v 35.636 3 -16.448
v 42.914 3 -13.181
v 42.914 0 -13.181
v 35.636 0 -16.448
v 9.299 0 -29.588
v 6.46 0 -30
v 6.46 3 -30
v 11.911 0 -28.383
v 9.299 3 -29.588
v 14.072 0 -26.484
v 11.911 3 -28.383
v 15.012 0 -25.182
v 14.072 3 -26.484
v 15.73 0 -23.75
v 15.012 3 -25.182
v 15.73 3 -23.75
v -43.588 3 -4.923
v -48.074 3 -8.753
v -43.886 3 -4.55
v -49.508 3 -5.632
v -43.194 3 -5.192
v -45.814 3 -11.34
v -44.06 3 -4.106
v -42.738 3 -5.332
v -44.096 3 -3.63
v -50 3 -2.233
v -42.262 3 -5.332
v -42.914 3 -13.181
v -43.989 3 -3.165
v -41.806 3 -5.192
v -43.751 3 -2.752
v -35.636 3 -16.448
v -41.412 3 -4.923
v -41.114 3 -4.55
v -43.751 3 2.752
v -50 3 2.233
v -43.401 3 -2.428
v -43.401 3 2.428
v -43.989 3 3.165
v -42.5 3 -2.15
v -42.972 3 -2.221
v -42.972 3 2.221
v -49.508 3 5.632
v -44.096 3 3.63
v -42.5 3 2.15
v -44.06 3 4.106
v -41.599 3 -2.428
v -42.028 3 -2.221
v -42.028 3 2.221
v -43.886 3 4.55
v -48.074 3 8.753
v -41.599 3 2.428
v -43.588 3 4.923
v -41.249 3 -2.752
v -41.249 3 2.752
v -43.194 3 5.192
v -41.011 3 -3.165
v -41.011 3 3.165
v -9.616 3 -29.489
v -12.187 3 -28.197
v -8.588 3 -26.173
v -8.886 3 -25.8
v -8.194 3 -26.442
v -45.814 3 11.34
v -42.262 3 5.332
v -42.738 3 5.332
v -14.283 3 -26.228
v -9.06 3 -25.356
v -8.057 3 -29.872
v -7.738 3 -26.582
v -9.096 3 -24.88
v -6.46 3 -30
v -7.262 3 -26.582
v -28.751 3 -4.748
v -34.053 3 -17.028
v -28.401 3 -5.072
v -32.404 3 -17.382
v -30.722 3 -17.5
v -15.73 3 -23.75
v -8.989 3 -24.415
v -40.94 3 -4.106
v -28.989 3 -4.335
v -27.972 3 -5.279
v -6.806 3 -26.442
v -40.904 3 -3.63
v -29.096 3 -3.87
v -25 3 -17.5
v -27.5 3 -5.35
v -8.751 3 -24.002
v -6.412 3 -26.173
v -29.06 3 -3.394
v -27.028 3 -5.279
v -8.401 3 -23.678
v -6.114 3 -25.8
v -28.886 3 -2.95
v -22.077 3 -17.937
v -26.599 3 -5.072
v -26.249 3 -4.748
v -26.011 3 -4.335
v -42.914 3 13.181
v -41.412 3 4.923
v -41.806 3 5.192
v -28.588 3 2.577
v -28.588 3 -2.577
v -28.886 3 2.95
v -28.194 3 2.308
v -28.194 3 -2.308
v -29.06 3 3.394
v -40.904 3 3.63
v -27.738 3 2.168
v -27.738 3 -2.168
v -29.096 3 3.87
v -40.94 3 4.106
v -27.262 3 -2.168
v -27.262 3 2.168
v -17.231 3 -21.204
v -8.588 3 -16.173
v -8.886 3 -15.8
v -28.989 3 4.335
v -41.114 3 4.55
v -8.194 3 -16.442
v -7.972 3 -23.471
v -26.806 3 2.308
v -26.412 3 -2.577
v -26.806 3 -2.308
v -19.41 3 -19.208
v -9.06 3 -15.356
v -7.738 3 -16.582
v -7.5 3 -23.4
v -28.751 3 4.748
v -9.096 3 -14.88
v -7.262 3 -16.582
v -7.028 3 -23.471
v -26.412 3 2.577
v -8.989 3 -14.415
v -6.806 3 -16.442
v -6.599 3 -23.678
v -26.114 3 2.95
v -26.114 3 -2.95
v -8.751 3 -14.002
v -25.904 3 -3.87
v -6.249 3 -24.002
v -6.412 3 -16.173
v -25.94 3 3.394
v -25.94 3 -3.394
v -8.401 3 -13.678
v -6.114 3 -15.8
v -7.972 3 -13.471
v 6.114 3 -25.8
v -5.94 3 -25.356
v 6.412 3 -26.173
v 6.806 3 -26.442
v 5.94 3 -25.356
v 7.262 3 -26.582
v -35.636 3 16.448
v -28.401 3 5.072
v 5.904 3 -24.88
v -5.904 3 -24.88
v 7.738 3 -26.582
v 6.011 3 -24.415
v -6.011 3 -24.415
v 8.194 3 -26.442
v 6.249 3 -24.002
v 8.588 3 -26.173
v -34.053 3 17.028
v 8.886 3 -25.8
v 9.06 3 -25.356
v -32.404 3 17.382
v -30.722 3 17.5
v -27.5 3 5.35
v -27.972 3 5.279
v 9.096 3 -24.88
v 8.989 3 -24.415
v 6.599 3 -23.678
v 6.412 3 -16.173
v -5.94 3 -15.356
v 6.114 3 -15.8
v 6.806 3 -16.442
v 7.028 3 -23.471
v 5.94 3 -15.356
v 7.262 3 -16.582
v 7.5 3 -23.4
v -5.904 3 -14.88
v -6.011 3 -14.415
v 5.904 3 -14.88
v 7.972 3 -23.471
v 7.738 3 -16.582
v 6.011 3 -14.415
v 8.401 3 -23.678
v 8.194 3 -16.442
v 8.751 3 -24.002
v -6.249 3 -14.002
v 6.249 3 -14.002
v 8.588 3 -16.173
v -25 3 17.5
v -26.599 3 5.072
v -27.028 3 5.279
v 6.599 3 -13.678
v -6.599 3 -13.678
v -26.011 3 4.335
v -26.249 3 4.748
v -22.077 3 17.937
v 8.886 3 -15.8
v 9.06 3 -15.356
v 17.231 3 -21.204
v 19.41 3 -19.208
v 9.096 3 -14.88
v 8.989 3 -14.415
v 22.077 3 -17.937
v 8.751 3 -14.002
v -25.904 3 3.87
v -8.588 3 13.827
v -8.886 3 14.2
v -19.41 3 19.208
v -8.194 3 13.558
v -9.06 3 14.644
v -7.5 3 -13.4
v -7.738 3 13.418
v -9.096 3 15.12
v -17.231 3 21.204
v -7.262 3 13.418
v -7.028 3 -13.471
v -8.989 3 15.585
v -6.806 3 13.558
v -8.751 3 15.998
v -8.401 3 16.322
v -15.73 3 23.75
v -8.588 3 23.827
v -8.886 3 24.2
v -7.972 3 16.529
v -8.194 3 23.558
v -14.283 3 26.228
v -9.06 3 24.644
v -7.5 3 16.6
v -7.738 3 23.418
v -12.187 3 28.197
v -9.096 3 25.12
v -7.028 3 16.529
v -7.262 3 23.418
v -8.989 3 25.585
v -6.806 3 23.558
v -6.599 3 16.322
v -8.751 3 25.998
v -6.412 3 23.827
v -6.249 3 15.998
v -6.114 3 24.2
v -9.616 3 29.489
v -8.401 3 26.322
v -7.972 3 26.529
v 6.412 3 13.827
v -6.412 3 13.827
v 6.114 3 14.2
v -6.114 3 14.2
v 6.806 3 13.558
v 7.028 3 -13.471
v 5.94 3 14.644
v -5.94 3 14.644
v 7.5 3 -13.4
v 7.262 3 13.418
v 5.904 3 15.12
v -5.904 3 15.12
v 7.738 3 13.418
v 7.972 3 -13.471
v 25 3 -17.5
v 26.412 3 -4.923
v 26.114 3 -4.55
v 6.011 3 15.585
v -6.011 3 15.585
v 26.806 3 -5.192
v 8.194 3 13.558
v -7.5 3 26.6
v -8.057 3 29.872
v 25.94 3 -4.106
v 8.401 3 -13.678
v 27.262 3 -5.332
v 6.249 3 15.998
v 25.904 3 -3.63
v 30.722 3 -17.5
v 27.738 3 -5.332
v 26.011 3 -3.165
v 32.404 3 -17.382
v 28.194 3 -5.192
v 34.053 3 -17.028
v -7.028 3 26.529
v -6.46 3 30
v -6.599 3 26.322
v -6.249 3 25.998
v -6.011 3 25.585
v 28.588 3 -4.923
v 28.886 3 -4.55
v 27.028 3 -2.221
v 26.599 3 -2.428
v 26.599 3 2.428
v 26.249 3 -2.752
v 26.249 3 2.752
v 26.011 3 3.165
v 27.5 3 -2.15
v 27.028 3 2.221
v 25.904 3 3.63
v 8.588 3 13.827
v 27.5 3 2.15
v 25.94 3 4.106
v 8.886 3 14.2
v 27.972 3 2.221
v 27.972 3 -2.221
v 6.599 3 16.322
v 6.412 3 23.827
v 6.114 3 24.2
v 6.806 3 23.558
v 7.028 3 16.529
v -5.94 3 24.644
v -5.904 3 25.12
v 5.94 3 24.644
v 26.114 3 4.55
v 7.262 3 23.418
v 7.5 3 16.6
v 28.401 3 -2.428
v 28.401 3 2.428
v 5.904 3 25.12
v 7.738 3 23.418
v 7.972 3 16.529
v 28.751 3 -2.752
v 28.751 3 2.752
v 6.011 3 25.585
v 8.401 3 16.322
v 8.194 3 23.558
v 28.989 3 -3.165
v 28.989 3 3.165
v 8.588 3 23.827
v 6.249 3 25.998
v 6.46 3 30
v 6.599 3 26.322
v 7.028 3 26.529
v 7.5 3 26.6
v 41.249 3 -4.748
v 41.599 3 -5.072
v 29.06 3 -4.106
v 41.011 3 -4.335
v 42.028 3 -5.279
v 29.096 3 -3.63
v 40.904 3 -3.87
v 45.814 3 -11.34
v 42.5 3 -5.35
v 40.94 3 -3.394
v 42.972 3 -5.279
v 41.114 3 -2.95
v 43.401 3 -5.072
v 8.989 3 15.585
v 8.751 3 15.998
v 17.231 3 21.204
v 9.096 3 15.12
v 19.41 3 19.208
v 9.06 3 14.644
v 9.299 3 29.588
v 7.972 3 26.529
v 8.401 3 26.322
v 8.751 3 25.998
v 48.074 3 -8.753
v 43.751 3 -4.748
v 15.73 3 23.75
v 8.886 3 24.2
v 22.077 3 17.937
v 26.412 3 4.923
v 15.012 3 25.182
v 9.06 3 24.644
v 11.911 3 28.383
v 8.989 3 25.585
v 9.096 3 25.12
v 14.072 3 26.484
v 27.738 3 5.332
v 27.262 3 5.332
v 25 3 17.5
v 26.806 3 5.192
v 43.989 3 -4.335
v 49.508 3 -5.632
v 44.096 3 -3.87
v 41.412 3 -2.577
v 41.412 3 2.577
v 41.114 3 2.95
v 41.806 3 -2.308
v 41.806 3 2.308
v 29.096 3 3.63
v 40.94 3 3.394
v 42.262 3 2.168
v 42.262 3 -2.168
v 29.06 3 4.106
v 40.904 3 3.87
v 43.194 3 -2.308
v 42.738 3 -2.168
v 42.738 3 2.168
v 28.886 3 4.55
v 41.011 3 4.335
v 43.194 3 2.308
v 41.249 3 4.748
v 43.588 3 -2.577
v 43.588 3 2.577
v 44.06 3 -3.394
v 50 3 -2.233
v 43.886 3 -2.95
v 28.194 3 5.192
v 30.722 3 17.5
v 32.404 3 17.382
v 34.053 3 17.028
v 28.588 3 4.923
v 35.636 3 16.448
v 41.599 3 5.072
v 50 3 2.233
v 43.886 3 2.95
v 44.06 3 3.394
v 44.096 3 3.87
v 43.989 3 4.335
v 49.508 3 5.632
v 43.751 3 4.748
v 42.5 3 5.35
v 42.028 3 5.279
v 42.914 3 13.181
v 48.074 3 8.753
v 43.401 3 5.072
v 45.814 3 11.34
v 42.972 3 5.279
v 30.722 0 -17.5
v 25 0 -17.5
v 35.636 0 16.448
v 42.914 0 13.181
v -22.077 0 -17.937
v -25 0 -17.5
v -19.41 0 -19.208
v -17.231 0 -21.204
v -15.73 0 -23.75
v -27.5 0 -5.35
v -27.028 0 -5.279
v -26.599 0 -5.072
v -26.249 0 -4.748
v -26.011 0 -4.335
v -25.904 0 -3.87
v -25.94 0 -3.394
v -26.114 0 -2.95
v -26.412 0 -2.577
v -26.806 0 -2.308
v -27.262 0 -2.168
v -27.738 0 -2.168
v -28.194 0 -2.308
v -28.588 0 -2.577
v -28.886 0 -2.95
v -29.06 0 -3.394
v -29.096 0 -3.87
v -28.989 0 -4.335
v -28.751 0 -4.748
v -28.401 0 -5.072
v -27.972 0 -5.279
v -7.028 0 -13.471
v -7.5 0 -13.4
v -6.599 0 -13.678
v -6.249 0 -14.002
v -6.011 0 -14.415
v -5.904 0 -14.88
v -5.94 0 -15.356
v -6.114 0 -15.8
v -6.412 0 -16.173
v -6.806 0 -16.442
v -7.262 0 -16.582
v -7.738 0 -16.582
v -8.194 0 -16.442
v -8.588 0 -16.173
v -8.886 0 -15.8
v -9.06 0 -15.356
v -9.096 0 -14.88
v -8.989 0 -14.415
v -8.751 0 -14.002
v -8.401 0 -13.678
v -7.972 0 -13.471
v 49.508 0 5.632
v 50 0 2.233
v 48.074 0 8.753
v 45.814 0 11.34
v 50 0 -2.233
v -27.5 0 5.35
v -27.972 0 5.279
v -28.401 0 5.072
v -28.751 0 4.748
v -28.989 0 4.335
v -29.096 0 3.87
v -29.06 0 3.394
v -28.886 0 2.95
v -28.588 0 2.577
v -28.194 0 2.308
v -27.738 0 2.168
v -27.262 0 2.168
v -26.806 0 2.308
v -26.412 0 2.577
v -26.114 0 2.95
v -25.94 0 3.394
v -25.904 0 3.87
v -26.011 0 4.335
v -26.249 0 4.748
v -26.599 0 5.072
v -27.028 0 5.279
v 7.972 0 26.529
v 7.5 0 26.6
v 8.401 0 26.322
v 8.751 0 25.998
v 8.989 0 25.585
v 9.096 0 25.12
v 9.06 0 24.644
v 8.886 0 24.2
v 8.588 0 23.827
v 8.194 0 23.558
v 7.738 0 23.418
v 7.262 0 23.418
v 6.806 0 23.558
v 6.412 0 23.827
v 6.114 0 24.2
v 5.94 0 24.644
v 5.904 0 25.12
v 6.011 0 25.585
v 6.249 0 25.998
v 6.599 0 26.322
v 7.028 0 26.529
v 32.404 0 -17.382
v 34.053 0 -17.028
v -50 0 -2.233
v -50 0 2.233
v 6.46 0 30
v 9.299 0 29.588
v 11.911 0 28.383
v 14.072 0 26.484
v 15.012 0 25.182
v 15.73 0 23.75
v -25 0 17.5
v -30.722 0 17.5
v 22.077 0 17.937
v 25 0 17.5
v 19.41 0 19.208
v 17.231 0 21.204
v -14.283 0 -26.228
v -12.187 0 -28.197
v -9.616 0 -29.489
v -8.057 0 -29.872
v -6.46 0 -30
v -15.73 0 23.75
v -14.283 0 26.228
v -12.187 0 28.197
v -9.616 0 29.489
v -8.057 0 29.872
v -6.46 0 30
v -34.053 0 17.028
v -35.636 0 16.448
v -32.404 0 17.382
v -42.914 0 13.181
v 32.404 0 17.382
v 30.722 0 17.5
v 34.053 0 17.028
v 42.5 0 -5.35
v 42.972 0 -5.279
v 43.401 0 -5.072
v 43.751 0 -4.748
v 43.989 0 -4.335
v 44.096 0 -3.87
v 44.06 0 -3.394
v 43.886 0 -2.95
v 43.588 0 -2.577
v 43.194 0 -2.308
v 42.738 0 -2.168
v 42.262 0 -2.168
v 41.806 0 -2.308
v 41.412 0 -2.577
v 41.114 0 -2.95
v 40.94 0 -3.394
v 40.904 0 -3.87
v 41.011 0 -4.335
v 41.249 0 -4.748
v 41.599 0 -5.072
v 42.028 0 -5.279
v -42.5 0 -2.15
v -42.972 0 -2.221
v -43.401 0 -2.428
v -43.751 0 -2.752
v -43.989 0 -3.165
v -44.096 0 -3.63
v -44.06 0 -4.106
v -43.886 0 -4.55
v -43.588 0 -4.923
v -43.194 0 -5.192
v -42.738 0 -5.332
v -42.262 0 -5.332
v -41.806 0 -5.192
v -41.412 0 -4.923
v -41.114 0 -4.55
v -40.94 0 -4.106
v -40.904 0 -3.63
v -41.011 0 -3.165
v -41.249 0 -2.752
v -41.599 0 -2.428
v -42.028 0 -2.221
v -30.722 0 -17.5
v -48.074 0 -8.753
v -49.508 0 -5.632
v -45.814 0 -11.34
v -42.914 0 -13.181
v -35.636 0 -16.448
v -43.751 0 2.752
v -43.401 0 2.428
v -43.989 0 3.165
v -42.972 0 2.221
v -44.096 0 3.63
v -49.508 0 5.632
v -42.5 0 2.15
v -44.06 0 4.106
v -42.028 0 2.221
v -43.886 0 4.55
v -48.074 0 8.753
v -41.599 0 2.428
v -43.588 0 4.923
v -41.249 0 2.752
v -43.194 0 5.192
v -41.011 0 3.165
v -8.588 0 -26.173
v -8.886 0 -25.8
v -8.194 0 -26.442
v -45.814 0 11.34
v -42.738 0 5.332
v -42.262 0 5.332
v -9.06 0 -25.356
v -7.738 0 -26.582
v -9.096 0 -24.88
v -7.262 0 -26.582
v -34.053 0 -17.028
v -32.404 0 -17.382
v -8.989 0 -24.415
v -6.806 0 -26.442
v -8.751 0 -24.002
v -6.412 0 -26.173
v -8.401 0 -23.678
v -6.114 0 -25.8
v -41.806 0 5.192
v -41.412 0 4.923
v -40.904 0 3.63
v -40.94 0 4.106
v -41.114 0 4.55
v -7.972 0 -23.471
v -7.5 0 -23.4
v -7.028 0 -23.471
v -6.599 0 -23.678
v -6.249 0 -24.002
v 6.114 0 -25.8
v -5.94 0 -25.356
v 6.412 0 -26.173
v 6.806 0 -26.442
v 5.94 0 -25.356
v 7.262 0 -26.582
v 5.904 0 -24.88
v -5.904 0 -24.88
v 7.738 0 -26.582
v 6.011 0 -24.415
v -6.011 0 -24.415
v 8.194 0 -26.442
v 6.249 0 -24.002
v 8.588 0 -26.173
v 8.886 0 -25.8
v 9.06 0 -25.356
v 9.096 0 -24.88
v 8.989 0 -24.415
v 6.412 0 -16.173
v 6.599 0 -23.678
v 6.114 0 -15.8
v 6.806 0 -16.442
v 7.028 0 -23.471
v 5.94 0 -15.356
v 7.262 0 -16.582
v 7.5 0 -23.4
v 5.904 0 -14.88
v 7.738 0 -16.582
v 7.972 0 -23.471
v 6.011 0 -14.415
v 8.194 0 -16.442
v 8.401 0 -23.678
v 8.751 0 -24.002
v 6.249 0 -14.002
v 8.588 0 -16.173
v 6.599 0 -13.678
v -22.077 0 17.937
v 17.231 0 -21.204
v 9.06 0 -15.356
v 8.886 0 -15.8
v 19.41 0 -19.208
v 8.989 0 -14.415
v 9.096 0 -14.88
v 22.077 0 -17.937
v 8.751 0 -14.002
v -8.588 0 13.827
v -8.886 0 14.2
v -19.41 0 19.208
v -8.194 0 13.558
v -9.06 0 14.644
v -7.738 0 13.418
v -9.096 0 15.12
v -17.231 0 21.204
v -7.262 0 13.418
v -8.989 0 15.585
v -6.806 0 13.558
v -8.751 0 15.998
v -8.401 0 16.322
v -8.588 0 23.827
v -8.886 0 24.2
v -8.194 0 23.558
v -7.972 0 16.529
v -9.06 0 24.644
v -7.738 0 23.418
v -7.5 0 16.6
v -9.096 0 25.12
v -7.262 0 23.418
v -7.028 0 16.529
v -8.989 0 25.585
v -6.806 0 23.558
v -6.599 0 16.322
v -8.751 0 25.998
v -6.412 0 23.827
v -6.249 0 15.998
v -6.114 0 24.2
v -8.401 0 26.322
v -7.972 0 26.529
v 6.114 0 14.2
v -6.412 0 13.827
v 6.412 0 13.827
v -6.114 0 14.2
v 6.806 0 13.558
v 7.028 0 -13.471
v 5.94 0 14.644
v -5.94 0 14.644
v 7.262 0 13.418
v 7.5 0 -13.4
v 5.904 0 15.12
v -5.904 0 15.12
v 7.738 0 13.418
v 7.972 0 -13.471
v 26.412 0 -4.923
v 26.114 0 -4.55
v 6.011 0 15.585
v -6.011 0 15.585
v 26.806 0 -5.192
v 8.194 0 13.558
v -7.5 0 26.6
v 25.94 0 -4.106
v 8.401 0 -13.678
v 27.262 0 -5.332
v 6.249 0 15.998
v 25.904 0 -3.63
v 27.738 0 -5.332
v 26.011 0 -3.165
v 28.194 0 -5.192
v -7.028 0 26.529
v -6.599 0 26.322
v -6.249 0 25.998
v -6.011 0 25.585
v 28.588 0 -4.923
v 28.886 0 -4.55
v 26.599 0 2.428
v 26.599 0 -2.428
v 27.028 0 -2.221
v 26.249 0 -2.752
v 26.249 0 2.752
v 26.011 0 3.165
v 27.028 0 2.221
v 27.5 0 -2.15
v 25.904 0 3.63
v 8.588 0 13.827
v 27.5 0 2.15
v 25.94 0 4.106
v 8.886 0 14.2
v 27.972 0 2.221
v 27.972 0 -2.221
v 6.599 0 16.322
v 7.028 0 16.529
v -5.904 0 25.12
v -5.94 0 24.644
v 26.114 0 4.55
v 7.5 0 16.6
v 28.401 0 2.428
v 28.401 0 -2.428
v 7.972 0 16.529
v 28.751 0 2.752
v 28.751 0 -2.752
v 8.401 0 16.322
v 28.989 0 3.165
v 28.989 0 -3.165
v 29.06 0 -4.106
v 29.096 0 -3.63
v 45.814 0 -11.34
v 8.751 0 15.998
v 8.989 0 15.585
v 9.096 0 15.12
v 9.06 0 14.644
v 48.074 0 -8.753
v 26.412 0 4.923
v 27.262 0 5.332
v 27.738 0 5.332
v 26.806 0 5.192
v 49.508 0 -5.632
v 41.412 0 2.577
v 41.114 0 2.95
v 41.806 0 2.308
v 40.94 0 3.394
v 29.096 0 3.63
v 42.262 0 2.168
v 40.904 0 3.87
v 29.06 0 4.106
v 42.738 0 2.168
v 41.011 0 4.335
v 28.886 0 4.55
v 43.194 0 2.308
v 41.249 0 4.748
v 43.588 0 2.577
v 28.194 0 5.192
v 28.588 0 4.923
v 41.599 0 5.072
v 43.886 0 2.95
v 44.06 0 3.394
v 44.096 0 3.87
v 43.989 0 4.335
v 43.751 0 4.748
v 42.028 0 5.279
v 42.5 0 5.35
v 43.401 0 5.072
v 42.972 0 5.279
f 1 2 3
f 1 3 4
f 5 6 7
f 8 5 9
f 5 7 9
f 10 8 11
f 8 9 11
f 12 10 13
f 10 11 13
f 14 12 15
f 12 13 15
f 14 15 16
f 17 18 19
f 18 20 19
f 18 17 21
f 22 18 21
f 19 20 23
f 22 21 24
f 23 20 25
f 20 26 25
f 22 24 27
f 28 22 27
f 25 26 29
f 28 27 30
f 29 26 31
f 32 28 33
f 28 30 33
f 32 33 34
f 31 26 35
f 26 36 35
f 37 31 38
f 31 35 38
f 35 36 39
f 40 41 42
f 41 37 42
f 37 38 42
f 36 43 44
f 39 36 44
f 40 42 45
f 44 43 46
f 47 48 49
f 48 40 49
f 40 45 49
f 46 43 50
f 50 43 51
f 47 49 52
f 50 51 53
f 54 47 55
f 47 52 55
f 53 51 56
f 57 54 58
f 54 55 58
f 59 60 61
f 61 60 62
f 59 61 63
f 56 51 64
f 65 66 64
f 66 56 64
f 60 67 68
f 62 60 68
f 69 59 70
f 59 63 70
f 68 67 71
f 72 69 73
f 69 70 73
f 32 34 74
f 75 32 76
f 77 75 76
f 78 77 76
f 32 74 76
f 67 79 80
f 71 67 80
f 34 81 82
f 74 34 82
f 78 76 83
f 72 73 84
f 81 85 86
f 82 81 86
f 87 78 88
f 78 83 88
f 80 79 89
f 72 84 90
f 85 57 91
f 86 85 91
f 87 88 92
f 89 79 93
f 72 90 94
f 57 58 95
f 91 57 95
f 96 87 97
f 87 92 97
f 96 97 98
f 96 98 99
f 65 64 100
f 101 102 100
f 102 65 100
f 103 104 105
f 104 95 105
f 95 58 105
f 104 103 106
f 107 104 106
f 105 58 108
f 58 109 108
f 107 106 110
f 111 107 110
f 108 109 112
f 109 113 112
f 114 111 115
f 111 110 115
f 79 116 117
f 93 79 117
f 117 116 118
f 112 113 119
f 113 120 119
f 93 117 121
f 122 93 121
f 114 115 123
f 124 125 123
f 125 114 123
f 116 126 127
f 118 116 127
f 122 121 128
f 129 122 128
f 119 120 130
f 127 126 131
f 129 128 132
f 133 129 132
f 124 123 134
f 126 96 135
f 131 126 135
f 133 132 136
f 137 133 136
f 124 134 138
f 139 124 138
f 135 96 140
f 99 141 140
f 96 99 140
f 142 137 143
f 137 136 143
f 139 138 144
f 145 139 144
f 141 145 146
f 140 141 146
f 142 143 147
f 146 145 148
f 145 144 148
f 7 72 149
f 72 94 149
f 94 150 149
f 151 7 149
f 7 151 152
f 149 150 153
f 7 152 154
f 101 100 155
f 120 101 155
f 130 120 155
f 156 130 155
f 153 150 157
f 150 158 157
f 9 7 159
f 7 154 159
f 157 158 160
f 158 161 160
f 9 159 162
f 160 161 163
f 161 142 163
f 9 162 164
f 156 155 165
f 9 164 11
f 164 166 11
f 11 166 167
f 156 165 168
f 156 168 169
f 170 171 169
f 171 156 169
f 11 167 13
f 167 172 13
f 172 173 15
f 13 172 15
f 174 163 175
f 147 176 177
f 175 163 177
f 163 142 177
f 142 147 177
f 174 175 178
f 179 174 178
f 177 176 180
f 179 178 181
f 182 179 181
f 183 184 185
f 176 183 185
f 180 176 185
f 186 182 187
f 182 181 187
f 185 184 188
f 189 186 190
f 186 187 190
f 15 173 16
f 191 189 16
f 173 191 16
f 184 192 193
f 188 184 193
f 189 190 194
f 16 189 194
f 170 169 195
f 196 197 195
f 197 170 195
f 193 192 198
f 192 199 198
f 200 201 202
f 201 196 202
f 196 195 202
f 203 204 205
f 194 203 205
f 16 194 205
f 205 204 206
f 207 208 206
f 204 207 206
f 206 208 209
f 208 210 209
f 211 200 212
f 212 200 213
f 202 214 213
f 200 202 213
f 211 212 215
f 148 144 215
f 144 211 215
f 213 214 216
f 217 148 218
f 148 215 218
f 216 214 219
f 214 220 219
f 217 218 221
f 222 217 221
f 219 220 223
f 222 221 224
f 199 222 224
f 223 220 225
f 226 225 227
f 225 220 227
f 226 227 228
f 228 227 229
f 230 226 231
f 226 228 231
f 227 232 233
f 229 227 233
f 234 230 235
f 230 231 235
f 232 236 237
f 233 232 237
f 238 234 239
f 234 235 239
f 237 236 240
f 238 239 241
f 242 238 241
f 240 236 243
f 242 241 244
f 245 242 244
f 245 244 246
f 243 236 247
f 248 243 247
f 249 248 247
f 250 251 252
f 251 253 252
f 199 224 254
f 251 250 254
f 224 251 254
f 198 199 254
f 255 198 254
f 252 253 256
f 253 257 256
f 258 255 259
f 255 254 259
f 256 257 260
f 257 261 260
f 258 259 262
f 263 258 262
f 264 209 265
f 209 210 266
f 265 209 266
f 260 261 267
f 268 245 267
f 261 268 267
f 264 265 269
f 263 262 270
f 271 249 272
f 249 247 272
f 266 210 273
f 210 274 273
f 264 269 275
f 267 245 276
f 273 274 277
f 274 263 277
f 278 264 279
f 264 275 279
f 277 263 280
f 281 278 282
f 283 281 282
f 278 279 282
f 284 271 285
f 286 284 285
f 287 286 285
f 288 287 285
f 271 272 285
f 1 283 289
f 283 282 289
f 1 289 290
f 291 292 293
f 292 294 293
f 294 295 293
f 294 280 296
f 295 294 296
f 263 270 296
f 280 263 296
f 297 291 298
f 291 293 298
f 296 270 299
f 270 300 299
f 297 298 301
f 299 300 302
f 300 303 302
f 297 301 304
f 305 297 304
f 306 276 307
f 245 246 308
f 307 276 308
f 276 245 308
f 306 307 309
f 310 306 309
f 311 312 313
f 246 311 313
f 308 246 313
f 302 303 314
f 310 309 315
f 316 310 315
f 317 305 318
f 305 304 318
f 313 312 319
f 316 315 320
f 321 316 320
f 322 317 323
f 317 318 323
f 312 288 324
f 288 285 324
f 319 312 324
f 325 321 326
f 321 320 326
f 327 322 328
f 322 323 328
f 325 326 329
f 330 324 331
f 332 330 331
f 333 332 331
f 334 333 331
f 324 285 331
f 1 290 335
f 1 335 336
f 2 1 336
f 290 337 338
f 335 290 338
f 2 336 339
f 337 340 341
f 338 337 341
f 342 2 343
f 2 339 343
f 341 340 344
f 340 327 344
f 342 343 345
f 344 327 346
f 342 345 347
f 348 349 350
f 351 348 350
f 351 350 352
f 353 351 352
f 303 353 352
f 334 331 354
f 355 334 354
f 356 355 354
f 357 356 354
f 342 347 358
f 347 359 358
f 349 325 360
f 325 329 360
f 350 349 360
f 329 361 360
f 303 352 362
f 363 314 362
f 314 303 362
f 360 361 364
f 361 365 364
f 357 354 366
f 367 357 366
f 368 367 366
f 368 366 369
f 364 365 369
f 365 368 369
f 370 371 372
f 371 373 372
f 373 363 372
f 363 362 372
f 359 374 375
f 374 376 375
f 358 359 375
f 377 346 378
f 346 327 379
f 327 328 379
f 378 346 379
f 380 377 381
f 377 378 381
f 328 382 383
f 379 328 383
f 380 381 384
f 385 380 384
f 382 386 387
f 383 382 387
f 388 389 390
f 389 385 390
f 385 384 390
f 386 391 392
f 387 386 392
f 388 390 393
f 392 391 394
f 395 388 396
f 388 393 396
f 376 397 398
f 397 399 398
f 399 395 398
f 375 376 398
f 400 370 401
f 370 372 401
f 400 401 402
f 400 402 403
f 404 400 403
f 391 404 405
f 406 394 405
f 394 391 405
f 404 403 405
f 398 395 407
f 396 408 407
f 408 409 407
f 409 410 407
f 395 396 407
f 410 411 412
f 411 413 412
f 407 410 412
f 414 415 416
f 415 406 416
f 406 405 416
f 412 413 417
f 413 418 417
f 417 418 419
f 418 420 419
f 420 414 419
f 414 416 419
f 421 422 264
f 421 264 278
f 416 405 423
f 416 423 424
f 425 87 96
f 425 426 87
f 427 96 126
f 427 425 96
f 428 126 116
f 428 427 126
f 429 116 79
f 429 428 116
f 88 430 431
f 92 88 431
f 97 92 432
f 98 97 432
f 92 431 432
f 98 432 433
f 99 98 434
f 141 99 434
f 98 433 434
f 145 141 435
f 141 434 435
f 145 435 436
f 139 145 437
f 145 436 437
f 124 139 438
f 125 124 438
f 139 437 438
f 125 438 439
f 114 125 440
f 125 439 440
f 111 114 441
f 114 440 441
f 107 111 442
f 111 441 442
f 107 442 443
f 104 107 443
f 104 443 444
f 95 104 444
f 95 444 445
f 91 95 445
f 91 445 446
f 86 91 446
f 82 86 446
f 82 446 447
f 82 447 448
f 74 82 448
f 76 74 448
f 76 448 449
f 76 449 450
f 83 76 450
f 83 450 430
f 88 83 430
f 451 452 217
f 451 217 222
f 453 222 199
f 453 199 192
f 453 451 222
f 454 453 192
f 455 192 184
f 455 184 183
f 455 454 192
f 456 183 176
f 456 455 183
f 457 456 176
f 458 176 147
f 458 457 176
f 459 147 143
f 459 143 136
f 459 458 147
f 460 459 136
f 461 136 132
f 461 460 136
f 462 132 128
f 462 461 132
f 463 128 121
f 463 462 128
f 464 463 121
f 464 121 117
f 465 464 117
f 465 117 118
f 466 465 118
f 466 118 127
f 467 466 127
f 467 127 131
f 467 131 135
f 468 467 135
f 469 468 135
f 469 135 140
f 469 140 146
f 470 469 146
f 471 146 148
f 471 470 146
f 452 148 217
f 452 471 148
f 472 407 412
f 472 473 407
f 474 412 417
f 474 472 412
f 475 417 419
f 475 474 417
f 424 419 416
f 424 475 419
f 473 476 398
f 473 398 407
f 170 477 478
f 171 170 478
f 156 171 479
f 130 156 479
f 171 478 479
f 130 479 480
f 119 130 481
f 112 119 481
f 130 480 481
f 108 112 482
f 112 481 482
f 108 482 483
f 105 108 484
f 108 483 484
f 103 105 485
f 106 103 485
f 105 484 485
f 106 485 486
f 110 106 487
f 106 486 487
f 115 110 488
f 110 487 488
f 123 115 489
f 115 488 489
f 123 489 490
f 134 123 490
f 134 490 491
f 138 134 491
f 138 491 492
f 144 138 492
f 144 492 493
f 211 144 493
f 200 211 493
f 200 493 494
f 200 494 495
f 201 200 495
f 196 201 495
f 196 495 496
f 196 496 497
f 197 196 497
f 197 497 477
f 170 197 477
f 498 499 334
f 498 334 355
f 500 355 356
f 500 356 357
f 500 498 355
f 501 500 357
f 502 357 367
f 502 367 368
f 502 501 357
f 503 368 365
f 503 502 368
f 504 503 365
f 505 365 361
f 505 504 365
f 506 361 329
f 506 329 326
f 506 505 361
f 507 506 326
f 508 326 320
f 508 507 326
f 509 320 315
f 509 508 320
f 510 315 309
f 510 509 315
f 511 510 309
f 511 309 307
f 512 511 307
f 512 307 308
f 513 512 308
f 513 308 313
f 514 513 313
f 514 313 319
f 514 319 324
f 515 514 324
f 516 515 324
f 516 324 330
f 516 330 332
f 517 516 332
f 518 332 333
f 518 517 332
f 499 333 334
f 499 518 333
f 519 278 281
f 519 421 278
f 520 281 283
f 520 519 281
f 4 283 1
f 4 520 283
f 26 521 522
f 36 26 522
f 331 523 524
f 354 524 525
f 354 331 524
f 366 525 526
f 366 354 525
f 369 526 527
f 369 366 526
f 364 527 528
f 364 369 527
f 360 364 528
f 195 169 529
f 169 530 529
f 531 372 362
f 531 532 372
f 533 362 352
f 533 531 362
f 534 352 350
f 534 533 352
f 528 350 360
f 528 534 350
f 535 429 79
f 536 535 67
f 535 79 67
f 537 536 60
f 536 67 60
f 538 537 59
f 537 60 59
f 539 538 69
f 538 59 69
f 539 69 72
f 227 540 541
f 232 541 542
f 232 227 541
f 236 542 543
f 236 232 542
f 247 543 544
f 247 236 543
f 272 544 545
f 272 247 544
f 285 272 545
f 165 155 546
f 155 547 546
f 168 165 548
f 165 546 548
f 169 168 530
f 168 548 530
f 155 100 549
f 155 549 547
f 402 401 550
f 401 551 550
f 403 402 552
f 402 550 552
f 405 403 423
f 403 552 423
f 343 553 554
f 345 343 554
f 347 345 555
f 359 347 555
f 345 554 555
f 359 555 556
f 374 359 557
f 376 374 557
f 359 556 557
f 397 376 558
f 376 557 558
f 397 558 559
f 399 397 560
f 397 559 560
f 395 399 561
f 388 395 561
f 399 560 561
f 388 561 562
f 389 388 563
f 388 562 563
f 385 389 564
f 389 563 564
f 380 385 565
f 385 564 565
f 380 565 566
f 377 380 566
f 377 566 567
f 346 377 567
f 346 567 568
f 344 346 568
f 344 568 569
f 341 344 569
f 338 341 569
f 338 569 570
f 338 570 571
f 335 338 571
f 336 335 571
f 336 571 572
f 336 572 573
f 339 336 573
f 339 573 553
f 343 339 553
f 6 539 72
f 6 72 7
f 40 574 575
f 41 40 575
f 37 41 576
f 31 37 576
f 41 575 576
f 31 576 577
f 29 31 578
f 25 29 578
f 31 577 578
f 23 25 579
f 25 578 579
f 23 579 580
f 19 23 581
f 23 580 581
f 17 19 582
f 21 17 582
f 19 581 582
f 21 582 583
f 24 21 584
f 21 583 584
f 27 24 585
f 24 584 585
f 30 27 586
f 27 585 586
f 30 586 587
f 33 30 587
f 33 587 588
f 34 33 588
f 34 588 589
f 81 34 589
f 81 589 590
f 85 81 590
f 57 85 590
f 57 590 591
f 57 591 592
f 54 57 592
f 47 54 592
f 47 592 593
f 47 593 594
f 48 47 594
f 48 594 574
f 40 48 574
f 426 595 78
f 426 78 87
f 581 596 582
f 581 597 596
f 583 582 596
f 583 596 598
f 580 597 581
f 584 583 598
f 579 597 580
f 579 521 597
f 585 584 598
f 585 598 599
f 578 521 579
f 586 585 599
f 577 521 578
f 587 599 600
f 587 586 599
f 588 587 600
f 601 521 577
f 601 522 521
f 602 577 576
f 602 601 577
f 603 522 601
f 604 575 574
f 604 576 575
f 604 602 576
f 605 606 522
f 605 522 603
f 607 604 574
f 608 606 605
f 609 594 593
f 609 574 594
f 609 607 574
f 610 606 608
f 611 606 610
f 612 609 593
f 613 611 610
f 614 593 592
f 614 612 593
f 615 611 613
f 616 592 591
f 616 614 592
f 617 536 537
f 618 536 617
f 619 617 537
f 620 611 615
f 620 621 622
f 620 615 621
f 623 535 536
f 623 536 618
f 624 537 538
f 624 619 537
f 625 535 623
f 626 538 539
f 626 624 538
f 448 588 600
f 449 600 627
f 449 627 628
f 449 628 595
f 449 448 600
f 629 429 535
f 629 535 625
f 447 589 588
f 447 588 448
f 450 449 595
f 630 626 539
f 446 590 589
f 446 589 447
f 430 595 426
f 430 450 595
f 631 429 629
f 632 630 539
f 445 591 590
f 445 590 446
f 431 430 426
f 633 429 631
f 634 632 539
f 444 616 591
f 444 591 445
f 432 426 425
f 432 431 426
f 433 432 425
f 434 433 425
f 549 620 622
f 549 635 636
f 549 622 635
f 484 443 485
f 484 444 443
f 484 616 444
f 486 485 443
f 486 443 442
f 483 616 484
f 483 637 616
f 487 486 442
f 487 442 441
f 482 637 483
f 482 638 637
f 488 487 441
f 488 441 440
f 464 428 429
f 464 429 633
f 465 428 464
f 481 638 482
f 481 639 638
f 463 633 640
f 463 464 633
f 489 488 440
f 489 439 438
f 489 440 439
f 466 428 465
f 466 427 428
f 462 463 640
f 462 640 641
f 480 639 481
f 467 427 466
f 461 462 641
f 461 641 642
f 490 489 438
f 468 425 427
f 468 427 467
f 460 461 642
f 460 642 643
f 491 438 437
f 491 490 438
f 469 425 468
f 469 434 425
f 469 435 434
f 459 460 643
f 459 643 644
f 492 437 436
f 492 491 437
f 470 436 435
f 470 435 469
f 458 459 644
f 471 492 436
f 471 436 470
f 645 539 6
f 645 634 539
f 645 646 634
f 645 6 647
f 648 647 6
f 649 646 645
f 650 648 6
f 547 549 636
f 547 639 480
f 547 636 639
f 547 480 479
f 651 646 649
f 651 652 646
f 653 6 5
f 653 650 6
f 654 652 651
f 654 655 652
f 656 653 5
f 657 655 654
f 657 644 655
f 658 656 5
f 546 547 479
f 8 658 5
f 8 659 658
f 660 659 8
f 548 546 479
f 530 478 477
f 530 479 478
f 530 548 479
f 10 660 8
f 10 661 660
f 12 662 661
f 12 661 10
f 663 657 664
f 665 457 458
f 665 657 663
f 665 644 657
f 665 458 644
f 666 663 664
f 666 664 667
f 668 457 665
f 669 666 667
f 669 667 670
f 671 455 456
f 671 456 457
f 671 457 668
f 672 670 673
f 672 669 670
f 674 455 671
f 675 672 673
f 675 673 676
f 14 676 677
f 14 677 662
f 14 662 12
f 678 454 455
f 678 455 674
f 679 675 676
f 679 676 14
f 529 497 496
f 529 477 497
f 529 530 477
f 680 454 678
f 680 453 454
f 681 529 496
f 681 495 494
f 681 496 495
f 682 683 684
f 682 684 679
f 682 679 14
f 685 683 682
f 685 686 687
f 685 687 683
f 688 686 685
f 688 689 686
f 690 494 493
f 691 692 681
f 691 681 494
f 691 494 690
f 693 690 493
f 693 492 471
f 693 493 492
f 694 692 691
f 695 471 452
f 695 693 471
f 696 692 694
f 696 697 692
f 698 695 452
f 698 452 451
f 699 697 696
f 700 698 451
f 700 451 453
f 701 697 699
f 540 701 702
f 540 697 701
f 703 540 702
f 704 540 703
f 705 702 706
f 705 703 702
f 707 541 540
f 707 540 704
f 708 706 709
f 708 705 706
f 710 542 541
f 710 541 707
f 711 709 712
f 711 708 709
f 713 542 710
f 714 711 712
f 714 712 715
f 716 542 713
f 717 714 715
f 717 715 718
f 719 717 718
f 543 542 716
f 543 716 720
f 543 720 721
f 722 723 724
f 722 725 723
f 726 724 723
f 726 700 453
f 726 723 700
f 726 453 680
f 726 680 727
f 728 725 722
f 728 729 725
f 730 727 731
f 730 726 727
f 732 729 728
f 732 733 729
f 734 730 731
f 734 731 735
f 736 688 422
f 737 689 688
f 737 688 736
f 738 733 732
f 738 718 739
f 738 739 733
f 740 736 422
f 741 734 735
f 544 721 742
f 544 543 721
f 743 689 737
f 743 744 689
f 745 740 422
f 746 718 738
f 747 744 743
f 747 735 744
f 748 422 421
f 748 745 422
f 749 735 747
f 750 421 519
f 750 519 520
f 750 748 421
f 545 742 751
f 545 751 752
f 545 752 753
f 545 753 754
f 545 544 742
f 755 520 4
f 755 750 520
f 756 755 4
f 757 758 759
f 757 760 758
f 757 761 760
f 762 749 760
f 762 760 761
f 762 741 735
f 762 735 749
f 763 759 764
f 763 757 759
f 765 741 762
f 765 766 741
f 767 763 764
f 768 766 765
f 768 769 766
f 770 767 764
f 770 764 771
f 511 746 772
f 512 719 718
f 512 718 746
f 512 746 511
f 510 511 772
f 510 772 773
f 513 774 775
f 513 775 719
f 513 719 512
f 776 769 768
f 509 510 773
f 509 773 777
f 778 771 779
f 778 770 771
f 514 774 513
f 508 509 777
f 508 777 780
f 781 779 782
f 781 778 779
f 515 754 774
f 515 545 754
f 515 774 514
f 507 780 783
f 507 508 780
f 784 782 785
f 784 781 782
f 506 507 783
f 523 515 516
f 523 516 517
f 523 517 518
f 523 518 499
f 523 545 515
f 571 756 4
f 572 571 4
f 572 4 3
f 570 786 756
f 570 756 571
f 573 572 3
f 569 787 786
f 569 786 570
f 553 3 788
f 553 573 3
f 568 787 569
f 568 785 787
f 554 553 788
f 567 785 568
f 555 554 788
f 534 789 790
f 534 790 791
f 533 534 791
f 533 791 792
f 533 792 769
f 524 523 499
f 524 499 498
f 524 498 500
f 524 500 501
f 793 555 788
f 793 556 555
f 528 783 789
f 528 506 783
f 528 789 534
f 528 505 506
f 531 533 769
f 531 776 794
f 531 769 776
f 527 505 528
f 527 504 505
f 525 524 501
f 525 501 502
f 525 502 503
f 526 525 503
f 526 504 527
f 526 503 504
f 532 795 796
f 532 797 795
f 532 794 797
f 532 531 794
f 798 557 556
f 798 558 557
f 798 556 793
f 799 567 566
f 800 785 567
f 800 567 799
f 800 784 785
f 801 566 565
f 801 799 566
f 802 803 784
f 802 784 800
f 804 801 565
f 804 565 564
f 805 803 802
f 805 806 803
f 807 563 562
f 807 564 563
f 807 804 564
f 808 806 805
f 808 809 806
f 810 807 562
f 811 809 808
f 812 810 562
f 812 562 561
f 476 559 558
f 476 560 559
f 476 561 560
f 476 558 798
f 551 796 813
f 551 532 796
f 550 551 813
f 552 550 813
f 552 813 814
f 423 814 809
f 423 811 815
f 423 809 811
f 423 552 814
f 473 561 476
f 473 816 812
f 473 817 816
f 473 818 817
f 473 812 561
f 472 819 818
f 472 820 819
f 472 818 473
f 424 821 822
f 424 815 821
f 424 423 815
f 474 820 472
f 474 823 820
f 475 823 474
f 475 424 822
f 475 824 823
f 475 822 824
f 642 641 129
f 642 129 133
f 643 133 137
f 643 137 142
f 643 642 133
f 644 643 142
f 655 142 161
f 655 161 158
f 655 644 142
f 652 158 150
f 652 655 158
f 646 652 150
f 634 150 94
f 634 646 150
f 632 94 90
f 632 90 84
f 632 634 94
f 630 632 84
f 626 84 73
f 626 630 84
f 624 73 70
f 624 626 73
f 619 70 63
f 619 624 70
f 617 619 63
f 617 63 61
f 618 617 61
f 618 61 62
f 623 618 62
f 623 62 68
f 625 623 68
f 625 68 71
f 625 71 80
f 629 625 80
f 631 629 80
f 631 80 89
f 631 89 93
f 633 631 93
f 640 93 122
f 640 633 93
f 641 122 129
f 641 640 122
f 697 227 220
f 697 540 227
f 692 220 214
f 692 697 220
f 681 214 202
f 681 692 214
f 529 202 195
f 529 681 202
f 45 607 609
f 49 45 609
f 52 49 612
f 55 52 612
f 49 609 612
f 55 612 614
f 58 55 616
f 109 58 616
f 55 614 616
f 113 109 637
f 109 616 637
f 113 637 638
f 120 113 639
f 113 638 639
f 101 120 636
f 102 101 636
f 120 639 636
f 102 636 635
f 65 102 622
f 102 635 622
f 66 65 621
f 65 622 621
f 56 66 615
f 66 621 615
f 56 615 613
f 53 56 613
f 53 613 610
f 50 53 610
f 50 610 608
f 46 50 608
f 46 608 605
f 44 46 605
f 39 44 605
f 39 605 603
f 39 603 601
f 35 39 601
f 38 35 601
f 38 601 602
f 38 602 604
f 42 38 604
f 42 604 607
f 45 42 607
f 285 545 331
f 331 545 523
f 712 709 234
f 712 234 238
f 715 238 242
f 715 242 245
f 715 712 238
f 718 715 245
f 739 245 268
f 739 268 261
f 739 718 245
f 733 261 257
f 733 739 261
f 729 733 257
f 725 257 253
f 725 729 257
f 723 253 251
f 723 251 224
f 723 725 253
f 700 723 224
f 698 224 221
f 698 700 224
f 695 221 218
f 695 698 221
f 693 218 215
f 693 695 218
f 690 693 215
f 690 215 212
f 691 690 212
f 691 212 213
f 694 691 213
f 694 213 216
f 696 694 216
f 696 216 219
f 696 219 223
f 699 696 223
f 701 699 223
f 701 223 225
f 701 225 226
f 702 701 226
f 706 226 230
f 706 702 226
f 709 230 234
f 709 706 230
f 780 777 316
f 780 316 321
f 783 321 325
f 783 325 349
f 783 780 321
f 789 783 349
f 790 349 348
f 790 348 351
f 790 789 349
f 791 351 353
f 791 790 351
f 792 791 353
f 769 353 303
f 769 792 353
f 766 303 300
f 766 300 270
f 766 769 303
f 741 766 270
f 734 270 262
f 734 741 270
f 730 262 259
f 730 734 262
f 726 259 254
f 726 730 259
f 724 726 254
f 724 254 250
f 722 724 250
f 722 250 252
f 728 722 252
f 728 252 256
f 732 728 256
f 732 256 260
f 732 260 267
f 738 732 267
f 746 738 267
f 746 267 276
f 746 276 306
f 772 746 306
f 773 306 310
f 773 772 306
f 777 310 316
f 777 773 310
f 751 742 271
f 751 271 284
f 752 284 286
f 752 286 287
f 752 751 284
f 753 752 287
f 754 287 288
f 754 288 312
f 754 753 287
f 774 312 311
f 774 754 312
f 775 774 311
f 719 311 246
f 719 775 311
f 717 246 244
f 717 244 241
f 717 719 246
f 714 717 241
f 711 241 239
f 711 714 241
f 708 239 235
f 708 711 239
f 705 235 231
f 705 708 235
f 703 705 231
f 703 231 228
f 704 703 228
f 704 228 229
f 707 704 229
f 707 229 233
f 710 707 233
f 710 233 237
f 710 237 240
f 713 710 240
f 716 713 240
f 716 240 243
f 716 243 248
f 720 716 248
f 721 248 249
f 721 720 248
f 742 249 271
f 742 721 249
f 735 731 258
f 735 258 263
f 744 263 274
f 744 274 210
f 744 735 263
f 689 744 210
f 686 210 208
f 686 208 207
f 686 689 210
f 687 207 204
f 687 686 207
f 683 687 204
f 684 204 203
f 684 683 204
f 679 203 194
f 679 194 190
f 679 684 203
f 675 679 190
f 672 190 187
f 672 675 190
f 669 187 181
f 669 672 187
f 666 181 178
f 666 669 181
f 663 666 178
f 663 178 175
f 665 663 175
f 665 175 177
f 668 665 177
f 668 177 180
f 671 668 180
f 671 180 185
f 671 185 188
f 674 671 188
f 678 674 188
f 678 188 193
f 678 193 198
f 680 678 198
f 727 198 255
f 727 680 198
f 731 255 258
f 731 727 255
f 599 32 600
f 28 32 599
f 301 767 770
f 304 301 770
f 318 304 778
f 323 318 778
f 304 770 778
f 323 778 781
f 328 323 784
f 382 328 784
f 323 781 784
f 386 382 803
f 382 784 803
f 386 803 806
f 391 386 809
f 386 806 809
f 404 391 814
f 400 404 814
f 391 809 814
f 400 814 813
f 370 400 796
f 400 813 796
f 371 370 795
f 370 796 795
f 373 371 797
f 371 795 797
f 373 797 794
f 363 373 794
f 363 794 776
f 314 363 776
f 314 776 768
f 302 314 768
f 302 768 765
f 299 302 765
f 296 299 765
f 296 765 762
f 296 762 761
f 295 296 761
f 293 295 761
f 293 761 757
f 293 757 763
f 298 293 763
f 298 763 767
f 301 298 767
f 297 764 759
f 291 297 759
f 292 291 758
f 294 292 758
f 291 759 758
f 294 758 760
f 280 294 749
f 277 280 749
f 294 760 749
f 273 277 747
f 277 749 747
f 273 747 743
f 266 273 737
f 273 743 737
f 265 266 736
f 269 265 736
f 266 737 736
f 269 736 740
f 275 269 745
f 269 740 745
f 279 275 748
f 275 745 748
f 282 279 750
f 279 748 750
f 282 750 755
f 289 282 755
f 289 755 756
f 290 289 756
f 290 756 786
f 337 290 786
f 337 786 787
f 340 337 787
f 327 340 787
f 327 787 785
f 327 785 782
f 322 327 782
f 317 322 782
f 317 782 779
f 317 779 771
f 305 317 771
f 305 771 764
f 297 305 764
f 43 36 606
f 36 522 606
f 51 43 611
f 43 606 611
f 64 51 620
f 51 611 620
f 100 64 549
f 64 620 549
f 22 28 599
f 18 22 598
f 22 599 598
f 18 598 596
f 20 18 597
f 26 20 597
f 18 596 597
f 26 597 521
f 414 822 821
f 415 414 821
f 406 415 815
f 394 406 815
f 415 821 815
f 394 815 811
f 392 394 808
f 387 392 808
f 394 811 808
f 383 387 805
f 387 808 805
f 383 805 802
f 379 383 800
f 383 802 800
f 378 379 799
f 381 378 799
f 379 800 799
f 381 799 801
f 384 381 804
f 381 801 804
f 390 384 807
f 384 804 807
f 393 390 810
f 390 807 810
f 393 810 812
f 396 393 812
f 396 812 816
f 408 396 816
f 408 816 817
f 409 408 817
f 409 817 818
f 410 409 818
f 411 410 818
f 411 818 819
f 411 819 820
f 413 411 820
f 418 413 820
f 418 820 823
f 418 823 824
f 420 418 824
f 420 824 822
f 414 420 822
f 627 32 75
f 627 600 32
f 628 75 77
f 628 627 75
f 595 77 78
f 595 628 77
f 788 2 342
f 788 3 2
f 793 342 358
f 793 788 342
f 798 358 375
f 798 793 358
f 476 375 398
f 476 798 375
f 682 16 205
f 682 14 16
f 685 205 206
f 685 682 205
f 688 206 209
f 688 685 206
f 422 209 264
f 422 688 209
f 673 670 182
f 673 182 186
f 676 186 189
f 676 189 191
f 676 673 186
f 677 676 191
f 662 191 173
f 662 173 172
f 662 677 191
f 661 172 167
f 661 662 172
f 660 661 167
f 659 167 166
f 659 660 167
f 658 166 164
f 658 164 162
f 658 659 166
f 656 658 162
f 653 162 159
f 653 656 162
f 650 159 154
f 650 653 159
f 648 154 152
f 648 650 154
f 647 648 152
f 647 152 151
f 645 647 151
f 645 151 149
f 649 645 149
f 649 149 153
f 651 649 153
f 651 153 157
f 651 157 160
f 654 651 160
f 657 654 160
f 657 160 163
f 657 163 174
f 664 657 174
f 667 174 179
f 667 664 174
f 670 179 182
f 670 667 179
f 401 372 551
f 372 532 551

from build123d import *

# Parameters (mm, degrees)
SKETCH_2_W          = 30
SKETCH_2_H          = 60
SKETCH_2_R          = 1.6
EXTRUDE_1_DEPTH     = 3
SKETCH_3_W          = 100
SKETCH_3_H          = 35
SKETCH_3_W_2        = 28.612944684
SKETCH_3_H_2        = 33.572555392
EXTRUDE_2_DEPTH     = 3
SKETCH_4_R          = 1.6
CUT_EXTRUDE_1_DEPTH = 59.386642308
SKETCH_6_OUTSIDE_W  = 125.332
SKETCH_6_OUTSIDE_H  = 85.332
CUT_EXTRUDE_2_DEPTH = 59.386642308
FILLET_3_R          = 10
FILLET_4_R          = 10
FILLET_5_R          = 12
FILLET_6_R          = 12


with BuildPart() as part:
    # 草图2 → 凸台-拉伸1 (new body)
    with BuildSketch(Plane(origin=(0, 0, 0), x_dir=(1, 0, 0), z_dir=(0, 1, 0))):
        Rectangle(SKETCH_2_W, SKETCH_2_H)
        with Locations(Location((-7.5, -15, 0), (0, 0, 270))):
            Circle(SKETCH_2_R, mode=Mode.SUBTRACT)
        with Locations(Location((7.5, -15, 0), (0, 0, 270))):
            Circle(SKETCH_2_R, mode=Mode.SUBTRACT)
        with Locations(Location((7.5, 15, 0), (0, 0, 270))):
            Circle(SKETCH_2_R, mode=Mode.SUBTRACT)
        with Locations(Location((7.5, 25, 0), (0, 0, 270))):
            Circle(SKETCH_2_R, mode=Mode.SUBTRACT)
        with Locations(Location((-7.5, 15, 0), (0, 0, 270))):
            Circle(SKETCH_2_R, mode=Mode.SUBTRACT)
        with Locations(Location((-7.5, 25, 0), (0, 0, 270))):
            Circle(SKETCH_2_R, mode=Mode.SUBTRACT)
        with Locations(Location((7.5, -25, 0), (0, 0, 270))):
            Circle(SKETCH_2_R, mode=Mode.SUBTRACT)
        with Locations(Location((-7.5, -25, 0), (0, 0, 270))):
            Circle(SKETCH_2_R, mode=Mode.SUBTRACT)
    extrude(amount=EXTRUDE_1_DEPTH)

    # 草图3 → 凸台-拉伸2 (add)
    with BuildSketch(Plane.XZ):
        Rectangle(SKETCH_3_W, SKETCH_3_H)
        Rectangle(SKETCH_3_W_2, SKETCH_3_H_2, mode=Mode.SUBTRACT)
    extrude(amount=-EXTRUDE_2_DEPTH)

    # 草图4 → 切除-拉伸1 (cut, through all)
    with BuildSketch(Plane.XZ):
        with Locations(Location((-42.5, 3.75, 0), (0, 0, 270))):
            Circle(SKETCH_4_R)
        with Locations(Location((-42.5, -3.75, 0), (0, 0, 90))):
            Circle(SKETCH_4_R)
        with Locations(Location((-27.5, -3.75, 0), (0, 0, 270))):
            Circle(SKETCH_4_R)
        with Locations(Location((-27.5, 3.75, 0), (0, 0, 90))):
            Circle(SKETCH_4_R)
        with Locations(Location((42.5, 3.75, 0), (0, 0, 90))):
            Circle(SKETCH_4_R)
        with Locations(Location((42.5, -3.75, 0), (0, 0, 270))):
            Circle(SKETCH_4_R)
        with Locations(Location((27.5, -3.75, 0), (0, 0, 90))):
            Circle(SKETCH_4_R)
        with Locations(Location((27.5, 3.75, 0), (0, 0, 270))):
            Circle(SKETCH_4_R)
    extrude(amount=-CUT_EXTRUDE_1_DEPTH, mode=Mode.SUBTRACT)

    # 草图6 outside → 切除-拉伸2 (cut, through all)
    with BuildSketch(Plane(origin=(0, 3, 0), x_dir=(1, 0, 0), z_dir=(0, 1, 0))):
        Rectangle(SKETCH_6_OUTSIDE_W, SKETCH_6_OUTSIDE_H)
        Polygon((-15, 30), (-23.291561976, 17.5), (-33.291561976, 17.5), (-50, 10), (-50, -10), (-33.291561976, -17.5), (-23.291561976, -17.5), (-15, -30), (15, -30), (23.291561976, -17.5), (33.291561976, -17.5), (50, -10), (50, 10), (33.291561976, 17.5), (23.291561976, 17.5), (15, 30), align=None, mode=Mode.SUBTRACT)
    extrude(amount=-CUT_EXTRUDE_2_DEPTH, mode=Mode.SUBTRACT)

    # 圆角3
    fillet_3_edges = [part.edges().sort_by_distance(p)[0] for p in [
        (15, 1.5, -17.5),
        (15, 1.5, 17.5),
        (-15, 1.5, -17.5),
        (-15, 1.5, 17.5),
    ]]
    fillet(fillet_3_edges, radius=FILLET_3_R)

    # 圆角4
    fillet_4_edges = [part.edges().sort_by_distance(p)[0] for p in [
        (-15, 1.5, 30),
        (15, 1.5, 30),
        (15, 1.5, -30),
        (-15, 1.5, -30),
    ]]
    fillet(fillet_4_edges, radius=FILLET_4_R)

    # 圆角5
    fillet_5_edges = [part.edges().sort_by_distance(p)[0] for p in [
        (50, 1.5, -10),
        (50, 1.5, 10),
        (-50, 1.5, 10),
        (-50, 1.5, -10),
    ]]
    fillet(fillet_5_edges, radius=FILLET_5_R)

    # 圆角6
    fillet_6_edges = [part.edges().sort_by_distance(p)[0] for p in [
        (33.291561976, 1.5, -17.5),
        (33.291561976, 1.5, 17.5),
        (-33.291561976, 1.5, 17.5),
        (-33.291561976, 1.5, -17.5),
    ]]
    fillet(fillet_6_edges, radius=FILLET_6_R)


solid = part.part
